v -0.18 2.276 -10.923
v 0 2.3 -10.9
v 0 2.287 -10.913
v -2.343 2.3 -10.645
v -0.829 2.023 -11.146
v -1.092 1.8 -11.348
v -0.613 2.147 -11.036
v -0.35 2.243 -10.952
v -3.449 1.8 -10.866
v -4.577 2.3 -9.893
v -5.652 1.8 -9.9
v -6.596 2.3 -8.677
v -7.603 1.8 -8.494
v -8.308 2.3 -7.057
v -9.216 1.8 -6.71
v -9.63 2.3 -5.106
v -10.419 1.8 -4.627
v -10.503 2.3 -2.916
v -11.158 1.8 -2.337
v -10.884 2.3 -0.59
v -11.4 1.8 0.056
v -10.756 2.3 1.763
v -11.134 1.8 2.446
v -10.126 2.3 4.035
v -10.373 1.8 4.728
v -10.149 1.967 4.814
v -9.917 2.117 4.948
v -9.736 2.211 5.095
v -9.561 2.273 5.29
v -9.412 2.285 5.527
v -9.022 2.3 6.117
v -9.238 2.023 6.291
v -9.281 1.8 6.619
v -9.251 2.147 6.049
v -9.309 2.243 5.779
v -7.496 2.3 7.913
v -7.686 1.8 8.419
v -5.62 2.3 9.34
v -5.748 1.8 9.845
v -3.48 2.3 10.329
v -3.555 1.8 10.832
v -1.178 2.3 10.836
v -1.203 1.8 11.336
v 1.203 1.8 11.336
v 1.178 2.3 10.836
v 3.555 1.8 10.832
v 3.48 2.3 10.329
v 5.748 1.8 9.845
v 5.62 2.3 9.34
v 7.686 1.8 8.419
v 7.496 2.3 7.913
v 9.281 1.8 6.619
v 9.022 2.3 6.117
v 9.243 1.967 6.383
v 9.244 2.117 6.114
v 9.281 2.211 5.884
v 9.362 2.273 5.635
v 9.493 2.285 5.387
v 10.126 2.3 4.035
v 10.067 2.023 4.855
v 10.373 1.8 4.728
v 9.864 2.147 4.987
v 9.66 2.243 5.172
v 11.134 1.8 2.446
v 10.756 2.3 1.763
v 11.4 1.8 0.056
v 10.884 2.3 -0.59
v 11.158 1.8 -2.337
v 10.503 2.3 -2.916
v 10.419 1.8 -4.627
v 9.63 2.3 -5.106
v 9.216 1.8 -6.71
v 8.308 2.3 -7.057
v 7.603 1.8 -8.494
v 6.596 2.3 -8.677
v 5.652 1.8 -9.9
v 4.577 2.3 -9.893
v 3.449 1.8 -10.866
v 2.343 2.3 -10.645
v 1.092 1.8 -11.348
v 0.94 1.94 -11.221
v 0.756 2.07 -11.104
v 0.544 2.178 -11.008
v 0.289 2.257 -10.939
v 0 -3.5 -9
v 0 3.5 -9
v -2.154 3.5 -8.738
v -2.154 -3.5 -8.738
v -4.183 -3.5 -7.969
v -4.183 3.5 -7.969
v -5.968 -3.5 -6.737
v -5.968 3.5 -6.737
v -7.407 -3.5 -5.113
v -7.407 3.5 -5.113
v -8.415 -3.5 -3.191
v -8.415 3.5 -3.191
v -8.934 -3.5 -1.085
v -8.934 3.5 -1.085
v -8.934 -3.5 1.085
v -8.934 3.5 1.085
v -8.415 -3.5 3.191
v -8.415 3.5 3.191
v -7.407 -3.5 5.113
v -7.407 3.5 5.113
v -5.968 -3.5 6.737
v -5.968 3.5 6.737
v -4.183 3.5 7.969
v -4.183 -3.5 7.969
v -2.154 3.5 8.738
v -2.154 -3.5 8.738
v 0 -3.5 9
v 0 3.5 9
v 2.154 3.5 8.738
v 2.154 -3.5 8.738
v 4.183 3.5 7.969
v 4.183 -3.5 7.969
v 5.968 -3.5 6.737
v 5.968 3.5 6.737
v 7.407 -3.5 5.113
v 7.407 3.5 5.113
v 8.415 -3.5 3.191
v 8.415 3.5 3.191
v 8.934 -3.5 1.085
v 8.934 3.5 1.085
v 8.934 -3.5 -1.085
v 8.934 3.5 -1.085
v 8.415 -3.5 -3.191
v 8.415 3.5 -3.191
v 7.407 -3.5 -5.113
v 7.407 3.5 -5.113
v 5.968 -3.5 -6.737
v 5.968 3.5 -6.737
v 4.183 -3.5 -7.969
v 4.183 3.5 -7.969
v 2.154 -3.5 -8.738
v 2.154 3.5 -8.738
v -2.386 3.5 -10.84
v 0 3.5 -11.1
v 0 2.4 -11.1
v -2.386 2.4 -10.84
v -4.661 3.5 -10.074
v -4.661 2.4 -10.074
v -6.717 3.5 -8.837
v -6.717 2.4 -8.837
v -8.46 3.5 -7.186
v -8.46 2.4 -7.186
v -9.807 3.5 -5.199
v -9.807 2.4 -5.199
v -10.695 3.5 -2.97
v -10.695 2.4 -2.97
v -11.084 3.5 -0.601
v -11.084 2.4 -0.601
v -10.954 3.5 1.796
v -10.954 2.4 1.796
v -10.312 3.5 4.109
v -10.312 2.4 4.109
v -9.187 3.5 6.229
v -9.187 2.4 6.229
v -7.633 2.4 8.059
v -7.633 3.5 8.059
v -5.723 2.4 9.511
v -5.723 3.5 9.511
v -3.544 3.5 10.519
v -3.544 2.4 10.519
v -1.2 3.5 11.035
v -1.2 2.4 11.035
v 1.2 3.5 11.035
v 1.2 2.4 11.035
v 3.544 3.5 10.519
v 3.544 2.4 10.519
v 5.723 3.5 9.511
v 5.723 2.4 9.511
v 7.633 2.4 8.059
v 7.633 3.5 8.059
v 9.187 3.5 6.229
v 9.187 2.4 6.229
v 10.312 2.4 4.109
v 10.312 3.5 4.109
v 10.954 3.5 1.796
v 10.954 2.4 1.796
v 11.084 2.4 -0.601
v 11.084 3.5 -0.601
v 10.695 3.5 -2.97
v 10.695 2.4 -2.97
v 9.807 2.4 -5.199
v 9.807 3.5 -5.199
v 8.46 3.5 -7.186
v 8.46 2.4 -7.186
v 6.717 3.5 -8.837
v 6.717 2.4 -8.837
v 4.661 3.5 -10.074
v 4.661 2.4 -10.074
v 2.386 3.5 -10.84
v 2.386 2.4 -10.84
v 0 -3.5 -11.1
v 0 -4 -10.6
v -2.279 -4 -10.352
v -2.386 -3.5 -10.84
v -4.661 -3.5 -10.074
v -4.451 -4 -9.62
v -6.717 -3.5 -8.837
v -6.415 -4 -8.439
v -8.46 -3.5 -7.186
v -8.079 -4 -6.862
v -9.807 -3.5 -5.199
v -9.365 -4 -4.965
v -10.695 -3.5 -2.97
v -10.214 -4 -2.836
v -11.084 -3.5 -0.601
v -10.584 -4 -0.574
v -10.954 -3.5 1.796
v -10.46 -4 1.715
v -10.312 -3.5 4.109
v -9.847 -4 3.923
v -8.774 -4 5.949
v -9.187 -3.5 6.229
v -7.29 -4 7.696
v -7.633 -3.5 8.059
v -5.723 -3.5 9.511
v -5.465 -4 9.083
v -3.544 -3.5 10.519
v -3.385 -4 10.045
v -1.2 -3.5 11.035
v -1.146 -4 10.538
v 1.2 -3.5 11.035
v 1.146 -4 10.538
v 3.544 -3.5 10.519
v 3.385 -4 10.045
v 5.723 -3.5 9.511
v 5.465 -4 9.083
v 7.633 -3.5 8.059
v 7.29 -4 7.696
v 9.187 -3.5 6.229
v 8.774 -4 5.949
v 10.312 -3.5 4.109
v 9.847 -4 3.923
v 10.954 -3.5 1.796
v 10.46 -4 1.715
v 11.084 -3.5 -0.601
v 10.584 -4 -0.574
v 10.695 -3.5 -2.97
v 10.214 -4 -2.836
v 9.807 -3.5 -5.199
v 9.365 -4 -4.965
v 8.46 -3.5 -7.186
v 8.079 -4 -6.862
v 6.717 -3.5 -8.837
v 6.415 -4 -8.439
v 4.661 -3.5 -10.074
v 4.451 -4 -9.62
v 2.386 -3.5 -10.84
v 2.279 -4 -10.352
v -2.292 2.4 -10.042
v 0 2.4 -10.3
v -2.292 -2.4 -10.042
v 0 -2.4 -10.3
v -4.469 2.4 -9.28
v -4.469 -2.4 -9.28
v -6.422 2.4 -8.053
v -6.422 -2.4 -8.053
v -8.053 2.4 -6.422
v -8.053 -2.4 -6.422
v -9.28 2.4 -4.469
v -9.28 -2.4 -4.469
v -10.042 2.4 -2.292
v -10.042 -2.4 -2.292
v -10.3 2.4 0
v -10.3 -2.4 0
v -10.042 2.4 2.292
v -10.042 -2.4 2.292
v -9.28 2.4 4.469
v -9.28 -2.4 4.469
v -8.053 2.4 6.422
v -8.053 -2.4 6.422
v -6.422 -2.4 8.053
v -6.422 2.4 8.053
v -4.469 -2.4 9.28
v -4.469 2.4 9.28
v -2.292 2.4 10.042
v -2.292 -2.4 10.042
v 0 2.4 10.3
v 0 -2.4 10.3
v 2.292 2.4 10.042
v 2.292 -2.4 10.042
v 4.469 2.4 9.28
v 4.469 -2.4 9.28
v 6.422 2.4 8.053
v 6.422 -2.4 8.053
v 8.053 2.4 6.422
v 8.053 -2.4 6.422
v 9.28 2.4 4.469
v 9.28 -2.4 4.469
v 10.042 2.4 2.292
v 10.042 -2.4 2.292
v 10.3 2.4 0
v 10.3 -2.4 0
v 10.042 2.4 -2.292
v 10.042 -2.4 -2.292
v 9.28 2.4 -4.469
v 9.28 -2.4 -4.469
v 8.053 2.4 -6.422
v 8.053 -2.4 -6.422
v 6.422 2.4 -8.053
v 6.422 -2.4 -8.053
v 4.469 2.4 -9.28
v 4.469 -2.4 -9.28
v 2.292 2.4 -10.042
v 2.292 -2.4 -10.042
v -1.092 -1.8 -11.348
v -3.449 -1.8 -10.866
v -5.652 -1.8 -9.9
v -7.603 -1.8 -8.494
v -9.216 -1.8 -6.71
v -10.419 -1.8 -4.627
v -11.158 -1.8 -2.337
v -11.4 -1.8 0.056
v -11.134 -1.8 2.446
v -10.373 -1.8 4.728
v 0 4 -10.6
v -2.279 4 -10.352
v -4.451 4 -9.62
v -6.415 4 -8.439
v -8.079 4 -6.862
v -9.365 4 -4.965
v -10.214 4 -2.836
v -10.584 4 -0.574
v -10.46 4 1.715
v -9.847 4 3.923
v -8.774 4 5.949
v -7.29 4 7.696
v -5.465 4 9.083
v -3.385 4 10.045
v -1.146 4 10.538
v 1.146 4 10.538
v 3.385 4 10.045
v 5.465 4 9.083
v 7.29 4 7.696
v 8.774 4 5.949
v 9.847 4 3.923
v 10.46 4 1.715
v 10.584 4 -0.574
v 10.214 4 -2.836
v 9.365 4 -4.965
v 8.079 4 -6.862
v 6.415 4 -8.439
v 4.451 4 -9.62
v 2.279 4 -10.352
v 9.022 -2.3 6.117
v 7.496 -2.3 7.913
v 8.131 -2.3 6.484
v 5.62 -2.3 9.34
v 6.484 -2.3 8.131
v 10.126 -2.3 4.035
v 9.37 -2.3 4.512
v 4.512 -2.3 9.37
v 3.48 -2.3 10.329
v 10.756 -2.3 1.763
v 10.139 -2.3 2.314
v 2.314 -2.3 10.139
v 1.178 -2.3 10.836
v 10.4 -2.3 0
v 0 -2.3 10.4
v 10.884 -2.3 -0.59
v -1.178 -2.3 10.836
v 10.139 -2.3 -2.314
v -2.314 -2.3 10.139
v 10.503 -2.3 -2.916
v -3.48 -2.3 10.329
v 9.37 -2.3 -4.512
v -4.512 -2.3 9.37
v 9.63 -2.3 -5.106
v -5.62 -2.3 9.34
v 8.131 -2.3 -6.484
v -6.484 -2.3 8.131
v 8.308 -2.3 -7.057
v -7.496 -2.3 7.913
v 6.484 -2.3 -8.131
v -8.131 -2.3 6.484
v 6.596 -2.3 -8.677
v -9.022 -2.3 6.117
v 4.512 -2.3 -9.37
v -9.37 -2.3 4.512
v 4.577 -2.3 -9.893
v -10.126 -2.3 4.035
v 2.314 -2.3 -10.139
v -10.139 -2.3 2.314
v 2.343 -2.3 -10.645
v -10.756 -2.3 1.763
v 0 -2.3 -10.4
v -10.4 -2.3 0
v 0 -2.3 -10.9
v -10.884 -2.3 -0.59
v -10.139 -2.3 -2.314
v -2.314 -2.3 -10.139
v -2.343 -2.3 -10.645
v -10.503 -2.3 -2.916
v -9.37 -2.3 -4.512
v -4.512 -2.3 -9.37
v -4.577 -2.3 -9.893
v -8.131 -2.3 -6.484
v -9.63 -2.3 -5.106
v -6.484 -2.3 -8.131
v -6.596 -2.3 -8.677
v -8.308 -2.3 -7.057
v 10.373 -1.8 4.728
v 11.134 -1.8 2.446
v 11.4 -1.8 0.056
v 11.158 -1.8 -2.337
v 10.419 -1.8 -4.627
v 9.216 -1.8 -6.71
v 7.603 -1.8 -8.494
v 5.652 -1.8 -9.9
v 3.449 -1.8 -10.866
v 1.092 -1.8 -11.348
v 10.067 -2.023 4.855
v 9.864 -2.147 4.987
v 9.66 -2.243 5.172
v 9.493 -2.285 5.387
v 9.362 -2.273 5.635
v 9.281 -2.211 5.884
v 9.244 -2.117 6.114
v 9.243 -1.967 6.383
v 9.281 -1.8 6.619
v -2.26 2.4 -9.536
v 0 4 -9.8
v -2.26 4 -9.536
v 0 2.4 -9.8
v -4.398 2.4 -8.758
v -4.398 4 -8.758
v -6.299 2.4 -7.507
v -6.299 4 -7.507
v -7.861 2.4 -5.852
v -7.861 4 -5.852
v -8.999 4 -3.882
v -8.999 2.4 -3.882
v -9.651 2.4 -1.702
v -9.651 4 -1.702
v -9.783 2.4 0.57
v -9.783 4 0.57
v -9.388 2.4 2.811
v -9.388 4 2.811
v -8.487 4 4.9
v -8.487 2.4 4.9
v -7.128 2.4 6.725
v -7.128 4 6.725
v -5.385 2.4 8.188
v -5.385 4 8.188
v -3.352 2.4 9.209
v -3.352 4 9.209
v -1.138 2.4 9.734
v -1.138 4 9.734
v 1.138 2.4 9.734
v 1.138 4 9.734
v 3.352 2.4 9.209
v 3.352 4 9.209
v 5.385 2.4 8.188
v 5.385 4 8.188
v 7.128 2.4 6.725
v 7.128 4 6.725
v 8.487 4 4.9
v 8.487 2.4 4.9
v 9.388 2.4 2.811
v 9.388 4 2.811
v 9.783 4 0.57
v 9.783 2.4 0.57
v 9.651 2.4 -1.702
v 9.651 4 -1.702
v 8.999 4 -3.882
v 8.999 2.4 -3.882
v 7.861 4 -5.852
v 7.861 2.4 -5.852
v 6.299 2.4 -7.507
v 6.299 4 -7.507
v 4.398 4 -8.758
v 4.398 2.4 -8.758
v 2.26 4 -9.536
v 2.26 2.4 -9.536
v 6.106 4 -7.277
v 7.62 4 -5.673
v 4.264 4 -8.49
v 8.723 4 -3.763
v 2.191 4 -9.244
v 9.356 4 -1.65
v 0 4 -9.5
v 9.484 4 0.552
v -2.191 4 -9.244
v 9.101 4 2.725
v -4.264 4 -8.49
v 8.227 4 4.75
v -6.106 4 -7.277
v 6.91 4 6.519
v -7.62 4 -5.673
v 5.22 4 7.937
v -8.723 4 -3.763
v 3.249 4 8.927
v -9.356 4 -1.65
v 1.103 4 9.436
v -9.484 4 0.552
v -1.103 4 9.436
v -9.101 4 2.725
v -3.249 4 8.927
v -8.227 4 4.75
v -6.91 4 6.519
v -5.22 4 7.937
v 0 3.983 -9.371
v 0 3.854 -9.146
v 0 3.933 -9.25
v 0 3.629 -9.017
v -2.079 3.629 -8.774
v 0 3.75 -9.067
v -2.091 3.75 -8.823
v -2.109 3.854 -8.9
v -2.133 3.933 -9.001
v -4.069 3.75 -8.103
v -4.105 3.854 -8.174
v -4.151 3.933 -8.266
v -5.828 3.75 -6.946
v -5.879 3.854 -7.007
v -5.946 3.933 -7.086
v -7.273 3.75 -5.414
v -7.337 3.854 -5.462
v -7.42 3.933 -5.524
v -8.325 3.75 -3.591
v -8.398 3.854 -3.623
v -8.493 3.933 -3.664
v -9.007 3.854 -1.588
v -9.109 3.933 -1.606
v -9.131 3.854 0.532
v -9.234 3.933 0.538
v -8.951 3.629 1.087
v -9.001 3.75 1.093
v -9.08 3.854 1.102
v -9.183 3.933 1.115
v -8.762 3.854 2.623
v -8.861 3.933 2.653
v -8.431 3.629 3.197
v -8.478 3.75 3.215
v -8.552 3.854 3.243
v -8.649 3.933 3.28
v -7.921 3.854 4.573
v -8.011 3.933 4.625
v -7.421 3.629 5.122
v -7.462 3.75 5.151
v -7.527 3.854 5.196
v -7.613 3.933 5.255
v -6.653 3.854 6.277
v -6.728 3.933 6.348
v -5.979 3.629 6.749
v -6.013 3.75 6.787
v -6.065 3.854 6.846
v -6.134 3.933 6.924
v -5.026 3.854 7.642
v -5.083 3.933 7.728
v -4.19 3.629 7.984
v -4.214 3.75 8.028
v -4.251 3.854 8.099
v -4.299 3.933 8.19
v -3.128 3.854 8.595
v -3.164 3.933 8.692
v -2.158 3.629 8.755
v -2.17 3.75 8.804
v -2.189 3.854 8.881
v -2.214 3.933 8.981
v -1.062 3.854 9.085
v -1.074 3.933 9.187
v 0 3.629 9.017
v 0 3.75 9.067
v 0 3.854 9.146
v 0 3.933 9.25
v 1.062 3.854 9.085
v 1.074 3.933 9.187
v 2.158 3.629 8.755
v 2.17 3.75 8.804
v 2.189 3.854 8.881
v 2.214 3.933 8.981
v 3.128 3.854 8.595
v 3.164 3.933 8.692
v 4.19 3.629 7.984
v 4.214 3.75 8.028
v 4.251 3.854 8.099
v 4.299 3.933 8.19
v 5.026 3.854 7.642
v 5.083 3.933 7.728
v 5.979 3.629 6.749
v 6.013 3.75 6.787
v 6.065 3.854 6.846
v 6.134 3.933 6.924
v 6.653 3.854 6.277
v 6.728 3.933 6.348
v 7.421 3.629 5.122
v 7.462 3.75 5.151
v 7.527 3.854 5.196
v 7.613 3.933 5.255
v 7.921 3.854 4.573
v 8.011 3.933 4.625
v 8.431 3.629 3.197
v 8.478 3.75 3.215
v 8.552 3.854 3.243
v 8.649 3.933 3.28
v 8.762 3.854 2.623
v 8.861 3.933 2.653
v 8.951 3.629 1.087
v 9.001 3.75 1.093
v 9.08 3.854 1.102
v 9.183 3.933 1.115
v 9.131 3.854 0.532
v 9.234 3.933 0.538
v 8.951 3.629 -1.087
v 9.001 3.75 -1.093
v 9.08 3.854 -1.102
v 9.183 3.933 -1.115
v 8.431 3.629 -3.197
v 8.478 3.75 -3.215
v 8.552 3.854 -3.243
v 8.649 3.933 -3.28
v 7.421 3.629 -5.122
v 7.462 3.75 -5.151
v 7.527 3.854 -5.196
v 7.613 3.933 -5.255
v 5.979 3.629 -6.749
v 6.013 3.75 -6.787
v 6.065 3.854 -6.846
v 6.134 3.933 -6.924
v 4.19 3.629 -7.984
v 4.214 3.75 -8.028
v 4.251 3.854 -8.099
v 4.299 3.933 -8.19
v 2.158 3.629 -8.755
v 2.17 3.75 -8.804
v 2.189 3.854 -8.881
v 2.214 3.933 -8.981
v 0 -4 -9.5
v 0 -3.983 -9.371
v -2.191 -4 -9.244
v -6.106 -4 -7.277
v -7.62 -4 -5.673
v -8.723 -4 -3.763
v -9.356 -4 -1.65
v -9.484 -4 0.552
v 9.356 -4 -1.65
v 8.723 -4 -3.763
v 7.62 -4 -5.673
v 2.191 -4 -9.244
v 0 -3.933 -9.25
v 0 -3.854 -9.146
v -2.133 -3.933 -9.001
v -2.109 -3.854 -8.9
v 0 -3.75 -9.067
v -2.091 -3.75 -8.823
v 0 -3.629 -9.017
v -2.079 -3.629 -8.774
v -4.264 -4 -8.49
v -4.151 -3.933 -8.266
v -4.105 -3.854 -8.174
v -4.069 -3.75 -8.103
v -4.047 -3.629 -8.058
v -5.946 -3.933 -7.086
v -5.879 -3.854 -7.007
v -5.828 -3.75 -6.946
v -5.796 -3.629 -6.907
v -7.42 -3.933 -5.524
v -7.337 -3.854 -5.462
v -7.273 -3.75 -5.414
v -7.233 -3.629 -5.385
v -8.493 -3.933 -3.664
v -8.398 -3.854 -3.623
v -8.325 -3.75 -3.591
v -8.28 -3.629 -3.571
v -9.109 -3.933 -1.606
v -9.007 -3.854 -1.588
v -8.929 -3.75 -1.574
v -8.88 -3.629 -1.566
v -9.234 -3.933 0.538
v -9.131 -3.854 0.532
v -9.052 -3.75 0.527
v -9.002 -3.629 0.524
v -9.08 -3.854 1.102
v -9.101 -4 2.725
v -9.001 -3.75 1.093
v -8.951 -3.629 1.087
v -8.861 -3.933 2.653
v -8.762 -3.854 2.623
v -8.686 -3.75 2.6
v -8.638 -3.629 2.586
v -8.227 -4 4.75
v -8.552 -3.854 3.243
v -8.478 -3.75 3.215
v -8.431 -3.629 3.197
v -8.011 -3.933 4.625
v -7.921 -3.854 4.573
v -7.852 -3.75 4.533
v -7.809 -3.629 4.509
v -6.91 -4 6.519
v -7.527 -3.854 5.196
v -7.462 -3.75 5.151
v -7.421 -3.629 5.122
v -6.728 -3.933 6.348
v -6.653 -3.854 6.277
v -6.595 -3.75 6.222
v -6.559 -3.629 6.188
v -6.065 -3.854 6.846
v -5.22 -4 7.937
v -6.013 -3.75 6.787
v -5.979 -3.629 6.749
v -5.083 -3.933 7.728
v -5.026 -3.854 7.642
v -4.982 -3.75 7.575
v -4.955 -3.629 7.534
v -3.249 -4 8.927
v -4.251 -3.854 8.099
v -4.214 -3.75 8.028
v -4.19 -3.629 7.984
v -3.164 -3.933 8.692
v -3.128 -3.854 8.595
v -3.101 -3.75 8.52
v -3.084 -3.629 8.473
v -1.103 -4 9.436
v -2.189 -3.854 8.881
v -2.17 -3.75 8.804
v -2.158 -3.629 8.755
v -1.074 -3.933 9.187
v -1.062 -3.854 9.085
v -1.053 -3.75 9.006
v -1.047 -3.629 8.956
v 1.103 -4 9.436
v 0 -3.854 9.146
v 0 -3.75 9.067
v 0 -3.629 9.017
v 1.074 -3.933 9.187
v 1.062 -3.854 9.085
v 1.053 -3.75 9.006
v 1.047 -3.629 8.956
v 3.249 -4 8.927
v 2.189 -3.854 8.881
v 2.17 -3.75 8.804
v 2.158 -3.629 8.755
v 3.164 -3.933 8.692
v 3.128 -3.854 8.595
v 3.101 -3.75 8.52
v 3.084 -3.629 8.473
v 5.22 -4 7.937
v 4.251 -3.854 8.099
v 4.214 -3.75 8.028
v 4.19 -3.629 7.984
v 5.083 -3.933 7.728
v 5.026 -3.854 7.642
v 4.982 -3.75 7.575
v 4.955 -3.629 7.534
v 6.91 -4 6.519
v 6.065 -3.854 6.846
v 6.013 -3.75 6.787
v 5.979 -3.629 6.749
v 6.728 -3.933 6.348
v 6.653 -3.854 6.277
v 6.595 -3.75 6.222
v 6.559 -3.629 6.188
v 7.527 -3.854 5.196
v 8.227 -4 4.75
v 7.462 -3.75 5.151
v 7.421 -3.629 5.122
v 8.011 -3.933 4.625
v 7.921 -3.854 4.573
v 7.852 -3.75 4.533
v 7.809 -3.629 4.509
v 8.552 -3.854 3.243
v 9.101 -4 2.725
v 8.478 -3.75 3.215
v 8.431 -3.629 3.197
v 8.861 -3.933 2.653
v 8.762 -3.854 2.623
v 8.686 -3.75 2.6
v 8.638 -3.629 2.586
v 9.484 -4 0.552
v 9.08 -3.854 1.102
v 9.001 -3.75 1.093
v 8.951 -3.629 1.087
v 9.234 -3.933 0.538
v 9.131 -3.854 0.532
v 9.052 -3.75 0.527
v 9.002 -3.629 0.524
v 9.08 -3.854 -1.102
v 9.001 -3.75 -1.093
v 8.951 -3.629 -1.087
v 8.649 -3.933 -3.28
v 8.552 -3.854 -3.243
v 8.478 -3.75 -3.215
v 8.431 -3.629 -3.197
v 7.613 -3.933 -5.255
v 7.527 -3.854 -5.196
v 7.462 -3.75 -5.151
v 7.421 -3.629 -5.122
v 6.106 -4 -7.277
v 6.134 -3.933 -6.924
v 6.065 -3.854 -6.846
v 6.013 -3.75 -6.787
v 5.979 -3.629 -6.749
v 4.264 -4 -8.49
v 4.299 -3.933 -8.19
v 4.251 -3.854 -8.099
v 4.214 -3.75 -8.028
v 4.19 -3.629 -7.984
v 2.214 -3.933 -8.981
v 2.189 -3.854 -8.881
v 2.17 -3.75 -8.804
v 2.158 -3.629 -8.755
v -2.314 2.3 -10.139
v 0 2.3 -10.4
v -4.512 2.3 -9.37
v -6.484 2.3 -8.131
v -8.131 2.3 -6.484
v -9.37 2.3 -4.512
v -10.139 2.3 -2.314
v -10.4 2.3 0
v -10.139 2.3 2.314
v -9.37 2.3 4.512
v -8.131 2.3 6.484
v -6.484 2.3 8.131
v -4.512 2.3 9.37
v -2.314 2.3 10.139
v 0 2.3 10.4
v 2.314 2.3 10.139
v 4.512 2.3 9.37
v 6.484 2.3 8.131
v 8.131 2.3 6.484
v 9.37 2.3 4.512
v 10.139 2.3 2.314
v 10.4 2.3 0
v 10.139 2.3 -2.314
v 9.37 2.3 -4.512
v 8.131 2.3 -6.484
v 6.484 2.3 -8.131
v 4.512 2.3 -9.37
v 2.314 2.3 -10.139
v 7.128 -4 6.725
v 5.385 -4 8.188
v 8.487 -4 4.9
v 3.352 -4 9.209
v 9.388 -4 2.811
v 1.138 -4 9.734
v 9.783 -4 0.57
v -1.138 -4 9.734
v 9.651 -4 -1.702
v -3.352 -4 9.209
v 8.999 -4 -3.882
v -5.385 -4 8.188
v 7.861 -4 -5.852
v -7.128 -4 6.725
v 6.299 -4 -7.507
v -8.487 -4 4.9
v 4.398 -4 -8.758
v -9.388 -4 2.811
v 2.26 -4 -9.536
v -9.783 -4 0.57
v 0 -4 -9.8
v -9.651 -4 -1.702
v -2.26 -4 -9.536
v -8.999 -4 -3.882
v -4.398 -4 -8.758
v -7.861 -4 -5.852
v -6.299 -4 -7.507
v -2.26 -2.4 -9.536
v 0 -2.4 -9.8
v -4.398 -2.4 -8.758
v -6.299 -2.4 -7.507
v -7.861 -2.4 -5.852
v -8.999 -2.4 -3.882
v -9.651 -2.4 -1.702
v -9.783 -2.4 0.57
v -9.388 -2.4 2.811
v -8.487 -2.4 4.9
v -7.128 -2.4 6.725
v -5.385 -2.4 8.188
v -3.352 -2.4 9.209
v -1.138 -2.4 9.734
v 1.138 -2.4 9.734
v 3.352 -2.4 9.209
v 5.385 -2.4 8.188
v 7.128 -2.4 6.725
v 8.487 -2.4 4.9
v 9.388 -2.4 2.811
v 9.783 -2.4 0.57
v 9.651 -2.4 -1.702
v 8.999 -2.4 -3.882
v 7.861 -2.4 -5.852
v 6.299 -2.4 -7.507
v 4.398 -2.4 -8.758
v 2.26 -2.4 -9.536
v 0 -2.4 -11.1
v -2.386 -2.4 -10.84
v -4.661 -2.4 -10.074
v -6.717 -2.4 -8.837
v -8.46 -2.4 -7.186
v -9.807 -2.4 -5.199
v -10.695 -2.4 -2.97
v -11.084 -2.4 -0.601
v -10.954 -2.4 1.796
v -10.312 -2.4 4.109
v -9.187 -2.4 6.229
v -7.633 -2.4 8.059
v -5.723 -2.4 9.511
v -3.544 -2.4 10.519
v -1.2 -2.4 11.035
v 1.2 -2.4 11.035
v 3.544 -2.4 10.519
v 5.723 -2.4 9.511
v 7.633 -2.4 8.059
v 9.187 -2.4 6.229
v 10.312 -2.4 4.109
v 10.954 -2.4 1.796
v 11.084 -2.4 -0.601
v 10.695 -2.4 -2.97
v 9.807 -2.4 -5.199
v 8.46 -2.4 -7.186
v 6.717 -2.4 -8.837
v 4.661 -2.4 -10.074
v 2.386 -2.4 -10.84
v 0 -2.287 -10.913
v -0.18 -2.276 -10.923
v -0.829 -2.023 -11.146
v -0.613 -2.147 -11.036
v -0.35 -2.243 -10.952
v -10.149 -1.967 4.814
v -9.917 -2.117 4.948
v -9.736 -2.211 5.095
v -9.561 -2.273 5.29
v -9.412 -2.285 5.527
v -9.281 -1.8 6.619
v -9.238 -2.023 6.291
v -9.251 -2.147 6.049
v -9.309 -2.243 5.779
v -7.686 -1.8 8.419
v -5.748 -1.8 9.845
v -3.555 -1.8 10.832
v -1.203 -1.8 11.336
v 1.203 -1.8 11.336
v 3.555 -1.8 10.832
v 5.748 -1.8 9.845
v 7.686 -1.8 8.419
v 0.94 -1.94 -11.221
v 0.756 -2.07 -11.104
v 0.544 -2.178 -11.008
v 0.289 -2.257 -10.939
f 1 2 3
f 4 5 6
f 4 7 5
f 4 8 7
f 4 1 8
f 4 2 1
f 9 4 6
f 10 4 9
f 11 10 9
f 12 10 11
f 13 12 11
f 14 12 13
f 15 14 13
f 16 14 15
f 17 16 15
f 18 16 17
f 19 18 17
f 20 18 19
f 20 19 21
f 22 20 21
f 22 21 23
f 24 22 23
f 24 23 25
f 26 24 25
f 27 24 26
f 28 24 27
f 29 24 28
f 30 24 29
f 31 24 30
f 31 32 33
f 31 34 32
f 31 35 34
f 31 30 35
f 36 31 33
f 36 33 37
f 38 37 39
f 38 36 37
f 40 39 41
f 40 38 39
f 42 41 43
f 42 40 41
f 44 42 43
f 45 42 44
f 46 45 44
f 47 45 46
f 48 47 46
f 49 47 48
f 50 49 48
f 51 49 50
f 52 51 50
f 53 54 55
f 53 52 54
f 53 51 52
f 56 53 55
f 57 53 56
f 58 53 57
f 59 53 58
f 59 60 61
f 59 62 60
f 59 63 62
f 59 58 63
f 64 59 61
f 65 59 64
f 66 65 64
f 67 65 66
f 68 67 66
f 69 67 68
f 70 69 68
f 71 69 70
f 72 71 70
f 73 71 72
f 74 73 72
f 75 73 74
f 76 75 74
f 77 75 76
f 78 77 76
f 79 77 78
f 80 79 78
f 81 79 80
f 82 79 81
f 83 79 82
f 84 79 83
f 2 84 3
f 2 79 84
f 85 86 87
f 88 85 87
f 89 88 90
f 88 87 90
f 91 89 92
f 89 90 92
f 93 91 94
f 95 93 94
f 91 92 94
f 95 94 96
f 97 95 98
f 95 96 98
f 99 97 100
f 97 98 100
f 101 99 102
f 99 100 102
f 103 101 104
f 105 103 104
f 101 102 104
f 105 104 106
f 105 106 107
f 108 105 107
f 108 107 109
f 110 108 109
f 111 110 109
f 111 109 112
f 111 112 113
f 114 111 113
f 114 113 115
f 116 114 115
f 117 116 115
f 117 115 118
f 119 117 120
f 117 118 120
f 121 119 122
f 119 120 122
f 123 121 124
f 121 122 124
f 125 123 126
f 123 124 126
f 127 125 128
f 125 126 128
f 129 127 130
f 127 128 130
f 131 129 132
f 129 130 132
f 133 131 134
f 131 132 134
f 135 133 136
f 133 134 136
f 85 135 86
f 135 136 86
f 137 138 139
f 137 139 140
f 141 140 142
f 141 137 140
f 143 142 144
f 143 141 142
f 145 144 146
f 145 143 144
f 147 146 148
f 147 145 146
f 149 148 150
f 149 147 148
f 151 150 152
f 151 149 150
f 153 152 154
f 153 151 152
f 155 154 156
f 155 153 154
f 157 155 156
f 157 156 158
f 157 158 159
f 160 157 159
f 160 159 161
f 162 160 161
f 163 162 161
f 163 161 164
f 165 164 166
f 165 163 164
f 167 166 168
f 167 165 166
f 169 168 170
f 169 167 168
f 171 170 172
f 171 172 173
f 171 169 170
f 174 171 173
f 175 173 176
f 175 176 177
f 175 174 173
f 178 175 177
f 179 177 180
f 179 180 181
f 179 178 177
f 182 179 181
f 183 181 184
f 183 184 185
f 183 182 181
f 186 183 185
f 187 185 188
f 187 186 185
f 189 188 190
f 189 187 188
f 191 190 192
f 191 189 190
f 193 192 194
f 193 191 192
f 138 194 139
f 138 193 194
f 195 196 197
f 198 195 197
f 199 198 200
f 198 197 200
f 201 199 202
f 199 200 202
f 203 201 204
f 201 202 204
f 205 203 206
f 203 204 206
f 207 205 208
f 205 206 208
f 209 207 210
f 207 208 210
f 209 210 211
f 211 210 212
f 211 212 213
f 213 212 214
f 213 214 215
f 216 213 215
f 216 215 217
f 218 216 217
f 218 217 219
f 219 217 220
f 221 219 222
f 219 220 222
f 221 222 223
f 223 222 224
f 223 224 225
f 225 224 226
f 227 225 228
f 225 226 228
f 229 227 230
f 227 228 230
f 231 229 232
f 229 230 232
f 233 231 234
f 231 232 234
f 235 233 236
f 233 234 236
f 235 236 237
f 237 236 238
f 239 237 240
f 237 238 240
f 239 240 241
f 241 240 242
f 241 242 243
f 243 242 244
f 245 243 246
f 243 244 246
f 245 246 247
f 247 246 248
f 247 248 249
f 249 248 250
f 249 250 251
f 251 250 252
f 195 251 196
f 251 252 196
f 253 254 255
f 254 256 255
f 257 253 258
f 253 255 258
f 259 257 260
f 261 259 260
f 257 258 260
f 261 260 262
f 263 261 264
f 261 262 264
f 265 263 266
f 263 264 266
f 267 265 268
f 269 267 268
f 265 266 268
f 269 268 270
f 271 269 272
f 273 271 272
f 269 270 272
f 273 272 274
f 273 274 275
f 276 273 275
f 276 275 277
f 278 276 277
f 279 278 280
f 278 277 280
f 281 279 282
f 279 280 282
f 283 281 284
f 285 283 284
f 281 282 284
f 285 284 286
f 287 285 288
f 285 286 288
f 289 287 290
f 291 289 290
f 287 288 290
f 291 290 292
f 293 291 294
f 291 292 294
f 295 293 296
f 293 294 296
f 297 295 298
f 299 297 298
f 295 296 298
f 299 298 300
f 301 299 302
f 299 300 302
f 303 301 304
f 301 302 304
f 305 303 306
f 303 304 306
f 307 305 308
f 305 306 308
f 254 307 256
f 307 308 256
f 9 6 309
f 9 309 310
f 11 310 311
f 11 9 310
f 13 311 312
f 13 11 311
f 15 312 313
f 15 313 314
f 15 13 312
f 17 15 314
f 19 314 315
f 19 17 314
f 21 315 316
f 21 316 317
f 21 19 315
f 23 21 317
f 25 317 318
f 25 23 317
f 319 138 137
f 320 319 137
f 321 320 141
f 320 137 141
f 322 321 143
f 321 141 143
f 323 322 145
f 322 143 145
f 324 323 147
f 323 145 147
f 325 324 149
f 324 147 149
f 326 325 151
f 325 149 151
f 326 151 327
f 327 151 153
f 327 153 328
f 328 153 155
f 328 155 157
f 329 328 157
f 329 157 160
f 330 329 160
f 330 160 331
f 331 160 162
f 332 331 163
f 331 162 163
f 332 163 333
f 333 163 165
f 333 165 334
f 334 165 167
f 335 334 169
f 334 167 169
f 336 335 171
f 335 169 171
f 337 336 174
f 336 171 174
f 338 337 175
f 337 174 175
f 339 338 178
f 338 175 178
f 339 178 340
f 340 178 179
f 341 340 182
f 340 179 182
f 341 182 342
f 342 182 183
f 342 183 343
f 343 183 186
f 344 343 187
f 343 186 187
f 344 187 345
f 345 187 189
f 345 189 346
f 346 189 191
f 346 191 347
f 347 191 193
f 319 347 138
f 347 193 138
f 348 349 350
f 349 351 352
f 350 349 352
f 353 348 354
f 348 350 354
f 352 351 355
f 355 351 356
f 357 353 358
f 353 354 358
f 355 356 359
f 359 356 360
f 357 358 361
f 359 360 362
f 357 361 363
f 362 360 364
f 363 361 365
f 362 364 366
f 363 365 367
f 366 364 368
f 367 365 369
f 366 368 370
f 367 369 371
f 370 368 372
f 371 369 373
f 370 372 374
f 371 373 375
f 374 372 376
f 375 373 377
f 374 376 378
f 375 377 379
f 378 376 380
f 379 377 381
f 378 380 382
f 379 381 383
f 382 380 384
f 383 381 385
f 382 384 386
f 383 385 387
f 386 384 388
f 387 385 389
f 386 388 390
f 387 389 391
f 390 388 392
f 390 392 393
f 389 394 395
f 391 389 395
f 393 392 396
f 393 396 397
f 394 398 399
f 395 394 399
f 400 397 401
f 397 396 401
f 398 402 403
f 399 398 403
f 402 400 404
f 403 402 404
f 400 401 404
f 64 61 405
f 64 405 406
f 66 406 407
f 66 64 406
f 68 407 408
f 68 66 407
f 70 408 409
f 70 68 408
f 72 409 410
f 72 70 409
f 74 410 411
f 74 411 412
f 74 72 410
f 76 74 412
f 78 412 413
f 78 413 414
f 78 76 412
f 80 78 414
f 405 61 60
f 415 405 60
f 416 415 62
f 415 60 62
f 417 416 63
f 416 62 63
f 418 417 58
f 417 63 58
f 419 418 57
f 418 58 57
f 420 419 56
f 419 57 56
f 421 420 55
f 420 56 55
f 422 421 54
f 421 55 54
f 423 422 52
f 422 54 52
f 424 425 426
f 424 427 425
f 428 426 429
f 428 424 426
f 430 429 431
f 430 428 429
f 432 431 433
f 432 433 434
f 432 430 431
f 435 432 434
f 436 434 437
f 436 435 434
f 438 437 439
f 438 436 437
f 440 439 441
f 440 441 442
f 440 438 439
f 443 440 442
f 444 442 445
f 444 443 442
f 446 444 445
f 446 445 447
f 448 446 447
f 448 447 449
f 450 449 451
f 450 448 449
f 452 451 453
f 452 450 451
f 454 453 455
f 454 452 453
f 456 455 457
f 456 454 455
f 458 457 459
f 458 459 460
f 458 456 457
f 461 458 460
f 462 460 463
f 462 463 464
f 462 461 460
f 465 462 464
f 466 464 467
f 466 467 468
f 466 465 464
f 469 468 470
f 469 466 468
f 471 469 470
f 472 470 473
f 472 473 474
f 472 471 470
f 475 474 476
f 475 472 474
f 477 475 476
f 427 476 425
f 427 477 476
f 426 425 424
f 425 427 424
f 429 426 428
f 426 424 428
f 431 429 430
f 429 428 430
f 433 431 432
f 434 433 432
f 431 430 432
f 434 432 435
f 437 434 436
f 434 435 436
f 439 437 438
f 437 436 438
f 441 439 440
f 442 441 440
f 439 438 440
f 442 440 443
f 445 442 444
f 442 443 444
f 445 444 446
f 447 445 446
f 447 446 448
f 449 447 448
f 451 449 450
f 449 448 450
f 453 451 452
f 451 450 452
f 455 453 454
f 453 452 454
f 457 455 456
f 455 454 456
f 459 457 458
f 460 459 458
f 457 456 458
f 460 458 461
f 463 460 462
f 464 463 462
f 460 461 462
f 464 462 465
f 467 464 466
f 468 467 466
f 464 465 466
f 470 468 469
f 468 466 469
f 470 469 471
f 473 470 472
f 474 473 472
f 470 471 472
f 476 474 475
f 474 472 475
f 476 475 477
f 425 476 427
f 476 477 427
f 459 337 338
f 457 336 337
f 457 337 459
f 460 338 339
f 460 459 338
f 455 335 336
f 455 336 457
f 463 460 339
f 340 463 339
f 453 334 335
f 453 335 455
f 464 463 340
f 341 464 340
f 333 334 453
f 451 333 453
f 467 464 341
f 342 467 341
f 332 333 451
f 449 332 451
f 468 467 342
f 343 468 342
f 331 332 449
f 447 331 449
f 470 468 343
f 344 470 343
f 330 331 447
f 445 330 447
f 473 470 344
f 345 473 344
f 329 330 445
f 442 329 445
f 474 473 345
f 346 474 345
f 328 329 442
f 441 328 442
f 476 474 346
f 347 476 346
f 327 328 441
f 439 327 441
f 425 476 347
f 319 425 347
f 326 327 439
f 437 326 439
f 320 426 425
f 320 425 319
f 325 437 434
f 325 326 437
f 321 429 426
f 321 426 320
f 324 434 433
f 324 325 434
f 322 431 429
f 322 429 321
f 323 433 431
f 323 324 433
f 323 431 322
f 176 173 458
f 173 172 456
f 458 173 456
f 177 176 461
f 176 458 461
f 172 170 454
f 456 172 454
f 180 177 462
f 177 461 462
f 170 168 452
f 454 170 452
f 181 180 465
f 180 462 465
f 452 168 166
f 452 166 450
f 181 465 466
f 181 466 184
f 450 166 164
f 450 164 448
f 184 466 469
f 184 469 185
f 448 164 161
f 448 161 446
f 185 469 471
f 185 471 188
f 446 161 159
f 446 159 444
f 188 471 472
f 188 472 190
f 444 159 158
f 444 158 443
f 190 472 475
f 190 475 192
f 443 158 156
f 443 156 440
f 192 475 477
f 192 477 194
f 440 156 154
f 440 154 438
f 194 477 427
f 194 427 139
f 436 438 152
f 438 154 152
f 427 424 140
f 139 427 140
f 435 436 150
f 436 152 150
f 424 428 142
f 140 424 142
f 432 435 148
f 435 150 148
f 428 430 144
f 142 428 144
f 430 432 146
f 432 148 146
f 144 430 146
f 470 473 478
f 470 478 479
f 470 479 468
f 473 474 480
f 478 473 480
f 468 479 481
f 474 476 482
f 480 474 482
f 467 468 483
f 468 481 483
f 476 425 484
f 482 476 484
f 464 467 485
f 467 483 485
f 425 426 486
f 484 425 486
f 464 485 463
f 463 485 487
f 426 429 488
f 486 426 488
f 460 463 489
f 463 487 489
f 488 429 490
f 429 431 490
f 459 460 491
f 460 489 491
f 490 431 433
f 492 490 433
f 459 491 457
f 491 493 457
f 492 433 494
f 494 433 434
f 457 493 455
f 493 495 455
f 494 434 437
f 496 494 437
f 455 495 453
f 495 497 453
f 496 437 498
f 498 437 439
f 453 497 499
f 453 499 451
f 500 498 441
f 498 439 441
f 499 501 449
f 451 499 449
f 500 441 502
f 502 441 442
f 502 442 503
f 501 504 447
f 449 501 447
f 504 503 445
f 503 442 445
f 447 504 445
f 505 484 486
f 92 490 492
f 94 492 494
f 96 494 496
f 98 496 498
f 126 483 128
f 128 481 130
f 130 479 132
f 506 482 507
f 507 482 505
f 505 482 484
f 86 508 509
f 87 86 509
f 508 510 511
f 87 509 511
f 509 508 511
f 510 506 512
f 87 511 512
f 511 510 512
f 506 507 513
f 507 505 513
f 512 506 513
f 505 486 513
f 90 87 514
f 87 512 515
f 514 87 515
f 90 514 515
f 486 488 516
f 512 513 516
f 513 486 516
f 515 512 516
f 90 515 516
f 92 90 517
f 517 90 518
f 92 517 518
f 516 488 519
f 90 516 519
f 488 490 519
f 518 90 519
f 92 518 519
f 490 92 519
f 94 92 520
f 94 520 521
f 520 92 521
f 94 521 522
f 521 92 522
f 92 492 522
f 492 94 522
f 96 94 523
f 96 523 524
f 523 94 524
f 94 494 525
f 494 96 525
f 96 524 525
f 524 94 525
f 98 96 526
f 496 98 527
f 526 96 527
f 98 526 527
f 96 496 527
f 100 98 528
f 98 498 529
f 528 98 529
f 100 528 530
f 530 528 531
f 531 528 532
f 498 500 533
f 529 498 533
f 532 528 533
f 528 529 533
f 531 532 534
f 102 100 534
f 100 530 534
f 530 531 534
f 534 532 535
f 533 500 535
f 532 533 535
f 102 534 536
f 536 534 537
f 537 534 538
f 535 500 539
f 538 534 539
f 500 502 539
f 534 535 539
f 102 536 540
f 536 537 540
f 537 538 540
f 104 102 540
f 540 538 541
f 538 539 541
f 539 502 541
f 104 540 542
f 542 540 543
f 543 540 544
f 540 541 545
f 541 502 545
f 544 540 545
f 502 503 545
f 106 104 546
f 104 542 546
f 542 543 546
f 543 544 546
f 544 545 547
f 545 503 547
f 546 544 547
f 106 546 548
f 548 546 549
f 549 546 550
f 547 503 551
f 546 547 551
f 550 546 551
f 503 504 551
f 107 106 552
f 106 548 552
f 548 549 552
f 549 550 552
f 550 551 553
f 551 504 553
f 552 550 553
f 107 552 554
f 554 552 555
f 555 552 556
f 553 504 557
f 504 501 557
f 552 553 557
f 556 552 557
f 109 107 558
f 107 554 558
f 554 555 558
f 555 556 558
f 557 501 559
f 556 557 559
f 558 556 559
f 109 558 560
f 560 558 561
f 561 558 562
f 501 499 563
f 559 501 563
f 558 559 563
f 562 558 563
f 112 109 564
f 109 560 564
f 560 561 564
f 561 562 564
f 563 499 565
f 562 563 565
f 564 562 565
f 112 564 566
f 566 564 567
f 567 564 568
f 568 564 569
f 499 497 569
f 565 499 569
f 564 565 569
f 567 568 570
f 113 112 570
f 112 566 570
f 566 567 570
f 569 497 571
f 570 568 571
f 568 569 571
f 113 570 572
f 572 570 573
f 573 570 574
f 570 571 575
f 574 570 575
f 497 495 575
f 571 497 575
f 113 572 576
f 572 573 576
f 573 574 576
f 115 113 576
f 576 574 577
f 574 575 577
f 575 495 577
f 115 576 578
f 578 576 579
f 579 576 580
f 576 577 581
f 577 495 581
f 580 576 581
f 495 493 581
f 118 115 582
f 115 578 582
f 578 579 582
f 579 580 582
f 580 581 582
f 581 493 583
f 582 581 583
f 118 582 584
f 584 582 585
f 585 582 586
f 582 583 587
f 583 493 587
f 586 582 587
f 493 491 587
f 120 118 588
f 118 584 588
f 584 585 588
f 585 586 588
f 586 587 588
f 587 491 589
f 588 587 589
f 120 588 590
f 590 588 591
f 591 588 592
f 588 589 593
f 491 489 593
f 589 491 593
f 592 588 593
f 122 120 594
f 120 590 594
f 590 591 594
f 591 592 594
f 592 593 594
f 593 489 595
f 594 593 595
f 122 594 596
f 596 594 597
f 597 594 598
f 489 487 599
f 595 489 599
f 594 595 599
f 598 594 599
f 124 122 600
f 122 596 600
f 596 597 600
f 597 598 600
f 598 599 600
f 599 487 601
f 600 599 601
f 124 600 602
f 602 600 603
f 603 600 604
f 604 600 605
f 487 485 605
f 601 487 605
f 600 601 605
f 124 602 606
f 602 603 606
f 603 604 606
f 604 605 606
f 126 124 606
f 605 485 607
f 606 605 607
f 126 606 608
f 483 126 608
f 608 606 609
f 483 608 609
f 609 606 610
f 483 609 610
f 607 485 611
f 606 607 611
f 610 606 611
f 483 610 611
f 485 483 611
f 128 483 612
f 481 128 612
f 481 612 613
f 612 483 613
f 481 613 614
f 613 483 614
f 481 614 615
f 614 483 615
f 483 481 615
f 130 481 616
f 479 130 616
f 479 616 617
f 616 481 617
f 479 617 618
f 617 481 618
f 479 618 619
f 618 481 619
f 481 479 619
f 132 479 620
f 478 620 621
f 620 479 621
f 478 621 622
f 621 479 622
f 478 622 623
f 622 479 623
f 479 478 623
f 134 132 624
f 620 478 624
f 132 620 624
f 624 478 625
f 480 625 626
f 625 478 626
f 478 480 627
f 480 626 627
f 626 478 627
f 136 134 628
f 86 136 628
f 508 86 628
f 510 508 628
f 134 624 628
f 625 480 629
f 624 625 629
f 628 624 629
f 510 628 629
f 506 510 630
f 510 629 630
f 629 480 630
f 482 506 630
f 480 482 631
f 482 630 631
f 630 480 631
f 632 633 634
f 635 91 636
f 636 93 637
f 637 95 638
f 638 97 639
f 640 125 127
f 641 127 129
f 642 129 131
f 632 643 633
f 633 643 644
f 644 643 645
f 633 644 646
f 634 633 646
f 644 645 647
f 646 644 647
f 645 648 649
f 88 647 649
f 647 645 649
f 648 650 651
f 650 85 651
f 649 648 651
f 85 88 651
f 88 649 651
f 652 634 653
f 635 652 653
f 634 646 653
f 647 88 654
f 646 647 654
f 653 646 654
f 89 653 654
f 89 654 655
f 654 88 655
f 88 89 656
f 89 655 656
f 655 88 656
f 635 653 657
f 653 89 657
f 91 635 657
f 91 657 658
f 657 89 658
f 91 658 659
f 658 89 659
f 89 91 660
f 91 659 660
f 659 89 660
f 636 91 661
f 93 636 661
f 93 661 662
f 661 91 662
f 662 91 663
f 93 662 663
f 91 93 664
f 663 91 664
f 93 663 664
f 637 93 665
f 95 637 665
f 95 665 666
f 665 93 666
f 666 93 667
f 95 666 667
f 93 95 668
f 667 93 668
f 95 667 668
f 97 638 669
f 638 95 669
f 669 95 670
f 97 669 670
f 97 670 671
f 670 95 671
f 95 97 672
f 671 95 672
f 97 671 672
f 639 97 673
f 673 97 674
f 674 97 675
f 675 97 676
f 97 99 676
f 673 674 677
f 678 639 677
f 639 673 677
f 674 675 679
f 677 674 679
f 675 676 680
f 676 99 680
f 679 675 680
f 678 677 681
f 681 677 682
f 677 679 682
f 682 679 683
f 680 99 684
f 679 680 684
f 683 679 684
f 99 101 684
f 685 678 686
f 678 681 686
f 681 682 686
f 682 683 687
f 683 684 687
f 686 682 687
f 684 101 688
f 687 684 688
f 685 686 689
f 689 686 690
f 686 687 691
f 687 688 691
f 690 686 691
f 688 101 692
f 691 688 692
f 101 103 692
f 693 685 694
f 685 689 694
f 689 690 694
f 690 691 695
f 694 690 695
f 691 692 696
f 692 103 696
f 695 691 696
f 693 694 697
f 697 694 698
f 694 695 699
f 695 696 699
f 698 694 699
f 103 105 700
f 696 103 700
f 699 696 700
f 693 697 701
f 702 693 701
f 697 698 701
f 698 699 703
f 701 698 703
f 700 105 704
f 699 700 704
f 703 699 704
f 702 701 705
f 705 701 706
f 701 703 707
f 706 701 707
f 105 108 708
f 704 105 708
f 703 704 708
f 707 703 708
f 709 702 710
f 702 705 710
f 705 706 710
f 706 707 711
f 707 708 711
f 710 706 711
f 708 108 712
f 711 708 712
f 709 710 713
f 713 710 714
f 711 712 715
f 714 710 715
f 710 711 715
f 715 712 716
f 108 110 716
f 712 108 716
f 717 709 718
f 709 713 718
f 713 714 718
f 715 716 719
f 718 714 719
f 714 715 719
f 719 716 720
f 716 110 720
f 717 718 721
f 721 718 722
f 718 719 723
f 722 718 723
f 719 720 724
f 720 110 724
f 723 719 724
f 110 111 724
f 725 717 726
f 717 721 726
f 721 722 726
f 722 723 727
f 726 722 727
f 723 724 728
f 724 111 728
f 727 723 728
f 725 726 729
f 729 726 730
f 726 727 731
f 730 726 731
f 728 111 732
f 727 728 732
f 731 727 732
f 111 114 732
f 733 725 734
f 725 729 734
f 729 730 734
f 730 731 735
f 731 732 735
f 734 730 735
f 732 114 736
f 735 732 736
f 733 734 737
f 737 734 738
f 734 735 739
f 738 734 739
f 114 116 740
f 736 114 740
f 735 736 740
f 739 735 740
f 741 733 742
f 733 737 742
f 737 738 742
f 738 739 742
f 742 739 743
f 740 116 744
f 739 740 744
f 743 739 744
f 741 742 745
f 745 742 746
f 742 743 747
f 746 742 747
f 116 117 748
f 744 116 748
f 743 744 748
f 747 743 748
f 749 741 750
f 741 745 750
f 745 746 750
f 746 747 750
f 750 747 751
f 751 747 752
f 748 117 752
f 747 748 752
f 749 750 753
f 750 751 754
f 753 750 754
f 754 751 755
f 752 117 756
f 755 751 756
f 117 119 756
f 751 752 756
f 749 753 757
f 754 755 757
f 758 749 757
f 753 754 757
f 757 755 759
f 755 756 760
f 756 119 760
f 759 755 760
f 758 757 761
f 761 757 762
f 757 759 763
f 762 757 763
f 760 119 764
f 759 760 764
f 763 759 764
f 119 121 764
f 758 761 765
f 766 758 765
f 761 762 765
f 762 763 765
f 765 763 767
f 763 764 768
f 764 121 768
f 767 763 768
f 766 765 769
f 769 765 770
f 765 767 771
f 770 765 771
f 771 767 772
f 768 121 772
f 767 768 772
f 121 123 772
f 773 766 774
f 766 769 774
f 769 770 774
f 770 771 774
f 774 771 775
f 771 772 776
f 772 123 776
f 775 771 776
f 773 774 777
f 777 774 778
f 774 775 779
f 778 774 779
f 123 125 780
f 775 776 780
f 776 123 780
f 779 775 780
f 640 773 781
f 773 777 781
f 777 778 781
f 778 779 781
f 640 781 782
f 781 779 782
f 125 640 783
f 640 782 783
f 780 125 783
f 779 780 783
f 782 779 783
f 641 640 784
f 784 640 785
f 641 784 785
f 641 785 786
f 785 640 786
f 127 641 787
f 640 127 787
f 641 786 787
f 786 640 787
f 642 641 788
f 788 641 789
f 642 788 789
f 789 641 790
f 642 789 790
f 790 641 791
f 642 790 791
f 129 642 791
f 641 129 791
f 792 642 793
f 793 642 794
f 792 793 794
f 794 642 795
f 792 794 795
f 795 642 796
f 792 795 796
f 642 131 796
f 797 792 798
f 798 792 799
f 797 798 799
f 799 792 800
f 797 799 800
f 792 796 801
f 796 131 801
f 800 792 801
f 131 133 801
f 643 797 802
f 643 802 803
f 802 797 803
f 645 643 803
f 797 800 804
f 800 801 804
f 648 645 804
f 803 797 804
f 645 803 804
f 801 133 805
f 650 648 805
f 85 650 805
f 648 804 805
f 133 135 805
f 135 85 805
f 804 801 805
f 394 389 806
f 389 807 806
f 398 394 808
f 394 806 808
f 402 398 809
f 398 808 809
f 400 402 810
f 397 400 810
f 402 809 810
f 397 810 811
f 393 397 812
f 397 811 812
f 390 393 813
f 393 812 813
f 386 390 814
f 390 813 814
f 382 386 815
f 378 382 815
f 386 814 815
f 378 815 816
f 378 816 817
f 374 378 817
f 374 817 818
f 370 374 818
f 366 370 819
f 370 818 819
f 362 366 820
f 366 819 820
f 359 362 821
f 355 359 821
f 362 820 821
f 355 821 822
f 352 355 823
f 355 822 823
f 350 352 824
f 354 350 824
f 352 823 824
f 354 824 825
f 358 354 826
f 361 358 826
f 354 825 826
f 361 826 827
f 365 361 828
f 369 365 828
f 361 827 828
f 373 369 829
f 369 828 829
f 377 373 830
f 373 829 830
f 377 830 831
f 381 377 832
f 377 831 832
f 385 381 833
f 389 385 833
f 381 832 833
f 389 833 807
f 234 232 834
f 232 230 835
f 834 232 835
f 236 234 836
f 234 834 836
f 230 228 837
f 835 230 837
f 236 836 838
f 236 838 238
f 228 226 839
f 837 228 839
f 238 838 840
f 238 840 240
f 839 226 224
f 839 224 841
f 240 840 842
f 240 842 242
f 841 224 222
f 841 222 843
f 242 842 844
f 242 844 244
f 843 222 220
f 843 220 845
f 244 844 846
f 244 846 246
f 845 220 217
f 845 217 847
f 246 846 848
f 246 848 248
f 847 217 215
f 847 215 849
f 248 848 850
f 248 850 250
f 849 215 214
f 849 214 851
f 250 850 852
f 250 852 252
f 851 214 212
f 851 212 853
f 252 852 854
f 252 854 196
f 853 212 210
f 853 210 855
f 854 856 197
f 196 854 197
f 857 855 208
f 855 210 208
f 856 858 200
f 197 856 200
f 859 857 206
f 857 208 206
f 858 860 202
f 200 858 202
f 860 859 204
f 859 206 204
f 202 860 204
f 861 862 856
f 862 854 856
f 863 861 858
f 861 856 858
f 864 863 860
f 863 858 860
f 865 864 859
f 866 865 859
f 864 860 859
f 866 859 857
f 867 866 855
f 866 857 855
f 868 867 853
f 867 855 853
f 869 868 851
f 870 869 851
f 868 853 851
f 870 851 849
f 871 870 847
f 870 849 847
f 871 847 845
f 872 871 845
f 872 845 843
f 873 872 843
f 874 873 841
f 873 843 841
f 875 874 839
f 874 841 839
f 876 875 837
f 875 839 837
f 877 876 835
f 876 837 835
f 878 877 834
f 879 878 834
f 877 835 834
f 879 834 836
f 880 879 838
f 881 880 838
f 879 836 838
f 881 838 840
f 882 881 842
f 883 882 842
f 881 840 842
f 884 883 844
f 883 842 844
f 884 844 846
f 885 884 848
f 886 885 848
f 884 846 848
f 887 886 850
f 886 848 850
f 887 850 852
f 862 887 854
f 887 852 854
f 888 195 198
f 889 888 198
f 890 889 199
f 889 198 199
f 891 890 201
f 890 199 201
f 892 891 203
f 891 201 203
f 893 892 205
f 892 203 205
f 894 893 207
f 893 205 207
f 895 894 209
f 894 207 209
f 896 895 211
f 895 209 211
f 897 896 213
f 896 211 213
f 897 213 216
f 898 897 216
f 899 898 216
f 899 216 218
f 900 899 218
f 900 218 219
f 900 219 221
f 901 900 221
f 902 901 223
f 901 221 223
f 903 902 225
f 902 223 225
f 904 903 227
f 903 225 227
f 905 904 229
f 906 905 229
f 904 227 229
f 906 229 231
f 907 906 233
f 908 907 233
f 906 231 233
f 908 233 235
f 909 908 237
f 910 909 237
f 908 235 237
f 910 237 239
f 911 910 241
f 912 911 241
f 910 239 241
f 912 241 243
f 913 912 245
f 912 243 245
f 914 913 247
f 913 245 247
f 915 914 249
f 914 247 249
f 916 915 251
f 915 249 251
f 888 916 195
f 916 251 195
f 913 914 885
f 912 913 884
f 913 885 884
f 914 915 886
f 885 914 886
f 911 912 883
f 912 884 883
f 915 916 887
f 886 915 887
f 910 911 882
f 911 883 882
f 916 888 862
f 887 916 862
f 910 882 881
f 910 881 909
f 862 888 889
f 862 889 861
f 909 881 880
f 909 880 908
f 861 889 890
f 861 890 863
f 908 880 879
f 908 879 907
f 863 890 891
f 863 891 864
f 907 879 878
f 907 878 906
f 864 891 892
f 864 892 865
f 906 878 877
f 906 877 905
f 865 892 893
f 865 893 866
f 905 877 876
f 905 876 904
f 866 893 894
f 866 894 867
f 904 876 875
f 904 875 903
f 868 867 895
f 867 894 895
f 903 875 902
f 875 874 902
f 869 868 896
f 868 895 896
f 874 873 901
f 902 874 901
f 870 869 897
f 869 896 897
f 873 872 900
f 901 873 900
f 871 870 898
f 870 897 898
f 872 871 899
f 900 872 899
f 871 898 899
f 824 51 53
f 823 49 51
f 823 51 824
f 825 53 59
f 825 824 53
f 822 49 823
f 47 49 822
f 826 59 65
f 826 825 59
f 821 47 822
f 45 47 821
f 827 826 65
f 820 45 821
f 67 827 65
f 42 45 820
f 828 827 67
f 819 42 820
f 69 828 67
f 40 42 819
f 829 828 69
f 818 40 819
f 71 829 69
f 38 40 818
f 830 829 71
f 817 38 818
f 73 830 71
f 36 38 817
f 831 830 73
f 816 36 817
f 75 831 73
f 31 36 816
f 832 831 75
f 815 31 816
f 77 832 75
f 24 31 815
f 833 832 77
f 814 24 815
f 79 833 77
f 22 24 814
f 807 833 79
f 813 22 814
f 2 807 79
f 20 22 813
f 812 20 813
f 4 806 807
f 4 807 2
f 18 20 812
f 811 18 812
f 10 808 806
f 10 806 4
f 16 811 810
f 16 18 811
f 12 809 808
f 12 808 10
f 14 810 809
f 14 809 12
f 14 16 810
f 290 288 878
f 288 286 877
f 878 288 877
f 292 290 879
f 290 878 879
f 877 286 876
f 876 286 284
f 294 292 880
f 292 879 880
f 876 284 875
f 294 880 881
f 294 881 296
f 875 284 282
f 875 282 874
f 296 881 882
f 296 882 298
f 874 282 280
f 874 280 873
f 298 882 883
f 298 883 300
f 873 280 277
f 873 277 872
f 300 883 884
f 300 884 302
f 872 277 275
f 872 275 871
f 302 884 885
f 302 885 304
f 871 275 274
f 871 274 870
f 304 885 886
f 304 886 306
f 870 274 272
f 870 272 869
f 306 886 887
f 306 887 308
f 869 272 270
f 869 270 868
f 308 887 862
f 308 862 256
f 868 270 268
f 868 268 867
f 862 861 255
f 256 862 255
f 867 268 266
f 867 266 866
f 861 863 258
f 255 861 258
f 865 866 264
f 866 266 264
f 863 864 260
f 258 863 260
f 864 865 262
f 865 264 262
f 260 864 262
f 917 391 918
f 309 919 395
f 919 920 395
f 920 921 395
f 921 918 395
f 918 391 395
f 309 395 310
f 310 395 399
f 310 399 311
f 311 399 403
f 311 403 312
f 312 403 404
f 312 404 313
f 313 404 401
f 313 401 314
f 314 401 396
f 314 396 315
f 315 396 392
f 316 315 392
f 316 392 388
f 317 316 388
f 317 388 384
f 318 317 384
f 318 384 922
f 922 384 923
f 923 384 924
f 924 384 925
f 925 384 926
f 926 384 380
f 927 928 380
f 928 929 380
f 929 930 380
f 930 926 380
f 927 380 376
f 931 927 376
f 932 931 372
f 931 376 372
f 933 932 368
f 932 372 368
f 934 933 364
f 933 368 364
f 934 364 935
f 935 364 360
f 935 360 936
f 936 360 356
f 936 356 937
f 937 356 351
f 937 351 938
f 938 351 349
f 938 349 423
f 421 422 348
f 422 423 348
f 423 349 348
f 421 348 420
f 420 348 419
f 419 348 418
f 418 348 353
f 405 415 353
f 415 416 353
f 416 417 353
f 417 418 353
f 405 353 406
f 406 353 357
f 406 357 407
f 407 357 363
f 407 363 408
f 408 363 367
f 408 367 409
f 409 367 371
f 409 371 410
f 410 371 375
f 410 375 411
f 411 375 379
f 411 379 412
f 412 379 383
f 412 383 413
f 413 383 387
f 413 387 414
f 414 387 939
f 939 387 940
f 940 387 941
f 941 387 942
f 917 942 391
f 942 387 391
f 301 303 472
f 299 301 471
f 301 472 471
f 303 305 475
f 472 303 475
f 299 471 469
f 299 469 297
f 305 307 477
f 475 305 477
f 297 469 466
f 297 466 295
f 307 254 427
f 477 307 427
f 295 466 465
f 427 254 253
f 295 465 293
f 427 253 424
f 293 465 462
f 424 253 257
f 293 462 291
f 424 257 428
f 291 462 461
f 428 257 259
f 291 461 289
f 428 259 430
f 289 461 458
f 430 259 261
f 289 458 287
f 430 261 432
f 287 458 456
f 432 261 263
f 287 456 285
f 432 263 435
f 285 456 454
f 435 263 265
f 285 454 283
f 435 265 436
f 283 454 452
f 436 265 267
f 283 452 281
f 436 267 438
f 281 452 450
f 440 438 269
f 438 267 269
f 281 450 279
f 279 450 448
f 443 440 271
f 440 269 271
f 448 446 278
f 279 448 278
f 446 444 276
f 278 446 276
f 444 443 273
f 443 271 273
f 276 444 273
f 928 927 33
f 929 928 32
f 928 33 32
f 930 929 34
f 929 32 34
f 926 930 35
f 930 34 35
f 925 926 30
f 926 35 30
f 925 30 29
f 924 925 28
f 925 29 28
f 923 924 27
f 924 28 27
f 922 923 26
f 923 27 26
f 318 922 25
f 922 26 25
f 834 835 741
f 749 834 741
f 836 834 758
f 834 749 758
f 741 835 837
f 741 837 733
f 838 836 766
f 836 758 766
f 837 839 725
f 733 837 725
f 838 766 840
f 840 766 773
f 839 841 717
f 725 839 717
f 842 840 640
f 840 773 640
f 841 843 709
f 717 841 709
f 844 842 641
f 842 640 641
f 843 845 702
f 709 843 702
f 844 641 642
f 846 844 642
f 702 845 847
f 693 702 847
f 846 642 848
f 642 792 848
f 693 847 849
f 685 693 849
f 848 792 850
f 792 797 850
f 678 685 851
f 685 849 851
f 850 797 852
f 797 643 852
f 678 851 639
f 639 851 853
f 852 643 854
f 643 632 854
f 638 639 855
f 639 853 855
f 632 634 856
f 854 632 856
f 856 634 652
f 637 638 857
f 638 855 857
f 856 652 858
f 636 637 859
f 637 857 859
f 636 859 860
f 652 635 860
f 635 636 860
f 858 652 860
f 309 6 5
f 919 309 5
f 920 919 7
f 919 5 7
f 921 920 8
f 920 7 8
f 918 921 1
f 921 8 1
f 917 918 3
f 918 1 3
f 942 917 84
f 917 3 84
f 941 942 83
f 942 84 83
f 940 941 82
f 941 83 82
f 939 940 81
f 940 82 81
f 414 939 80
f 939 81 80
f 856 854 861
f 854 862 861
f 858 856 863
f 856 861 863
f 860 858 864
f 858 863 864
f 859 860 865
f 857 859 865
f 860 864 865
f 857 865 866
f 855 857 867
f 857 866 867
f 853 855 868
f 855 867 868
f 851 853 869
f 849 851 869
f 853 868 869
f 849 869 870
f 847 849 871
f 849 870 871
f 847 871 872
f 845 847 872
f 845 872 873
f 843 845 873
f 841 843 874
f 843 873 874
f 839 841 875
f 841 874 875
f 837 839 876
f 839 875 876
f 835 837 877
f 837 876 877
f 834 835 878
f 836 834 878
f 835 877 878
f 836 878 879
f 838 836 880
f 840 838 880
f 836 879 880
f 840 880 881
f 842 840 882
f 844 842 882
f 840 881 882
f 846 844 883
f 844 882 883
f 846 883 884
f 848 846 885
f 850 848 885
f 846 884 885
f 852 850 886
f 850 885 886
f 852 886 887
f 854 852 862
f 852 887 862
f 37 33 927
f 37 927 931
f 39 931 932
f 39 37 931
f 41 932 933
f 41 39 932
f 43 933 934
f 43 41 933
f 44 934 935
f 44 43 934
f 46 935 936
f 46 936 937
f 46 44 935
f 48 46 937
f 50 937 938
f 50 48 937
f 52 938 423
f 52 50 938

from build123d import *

# Parameters (mm, degrees)
SKETCH1_W          = 1
SKETCH1_H          = 4.6
FILLET1_R          = 0.5
CHAMFER1_SIZE      = 0.5
CHAMFER2_SIZE      = 0.5
CHAMFER3_SIZE      = 0.5
SKETCH2_R          = 1.5875
CUT_EXTRUDE1_DEPTH = 5
CIRPATTERN1_COUNT  = 3


with BuildPart() as part:
    # Sketch1 → Revolve1 (revolve)
    with BuildSketch(Plane.XY, mode=Mode.PRIVATE) as revolve1_sk:
        Polygon((-10.3, -2.4), (-9.8, -2.4), (-9.8, -4), (-9, -4), (-9, 4), (-9.8, 4), (-9.8, 2.4), (-10.3, 2.4), align=None)
        with Locations((-10.9, 0)):
            Rectangle(SKETCH1_W, SKETCH1_H)
    revolve(revolve1_sk.sketch.rotate(Axis((0, 0, 0), (0, 1, 0)), 270), axis=Axis((0, 0, 0), (0, 1, 0)))

    # Fillet1
    fillet1_edges = [part.edges().sort_by_distance(p)[0] for p in [
        (0, -4, 9),
        (0, 4, 9),
    ]]
    fillet(fillet1_edges, radius=FILLET1_R)

    # Chamfer3
    chamfer3_edges = [part.edges().sort_by_distance(p)[0] for p in [
        (0, -2.3, 11.4),
        (0, 2.3, 11.4),
    ]]
    chamfer(chamfer3_edges, length=CHAMFER3_SIZE)

    # Sketch2 → Cut-Extrude1 (cut, symmetric)
    with BuildSketch(Plane(origin=(0, 0, 0), x_dir=(1, 0, 0), z_dir=(0, 1, 0))):
        with Locations((0, 12.5)):
            Circle(SKETCH2_R)
    cut_extrude1 = extrude(amount=CUT_EXTRUDE1_DEPTH, both=True, mode=Mode.SUBTRACT)

    # CirPattern1: Cut-Extrude1 ×3 about axis
    cirpattern1_axis = Axis((0, 0, 0), (0, 1, 0))
    for i in range(1, CIRPATTERN1_COUNT):
        add(cut_extrude1.rotate(cirpattern1_axis, i * 360 / CIRPATTERN1_COUNT), mode=Mode.SUBTRACT)


with BuildPart() as body_2:
    # Sketch1<3> → Revolve2 (revolve)
    with BuildSketch(Plane.XY, mode=Mode.PRIVATE) as revolve2_sk:
        Polygon((-11.1, 4), (-9.8, 4), (-9.8, 2.4), (-10.3, 2.4), (-11.1, 2.4), align=None)
        Polygon((-10.3, -2.4), (-11.1, -2.4), (-11.1, -4), (-9.8, -4), (-9.8, -2.4), align=None)
    revolve(revolve2_sk.sketch.rotate(Axis((0, 0, 0), (0, 1, 0)), 270), axis=Axis((0, 0, 0), (0, 1, 0)))

    # Chamfer1
    chamfer1_edges = [body_2.edges().sort_by_distance(p)[0] for p in [
        (0, 4, 11.1),
    ]]
    chamfer(chamfer1_edges, length=CHAMFER1_SIZE)

    # Chamfer2
    chamfer2_edges = [body_2.edges().sort_by_distance(p)[0] for p in [
        (0, -4, 11.1),
    ]]
    chamfer(chamfer2_edges, length=CHAMFER2_SIZE)


solid = Compound([part.part, body_2.part])
